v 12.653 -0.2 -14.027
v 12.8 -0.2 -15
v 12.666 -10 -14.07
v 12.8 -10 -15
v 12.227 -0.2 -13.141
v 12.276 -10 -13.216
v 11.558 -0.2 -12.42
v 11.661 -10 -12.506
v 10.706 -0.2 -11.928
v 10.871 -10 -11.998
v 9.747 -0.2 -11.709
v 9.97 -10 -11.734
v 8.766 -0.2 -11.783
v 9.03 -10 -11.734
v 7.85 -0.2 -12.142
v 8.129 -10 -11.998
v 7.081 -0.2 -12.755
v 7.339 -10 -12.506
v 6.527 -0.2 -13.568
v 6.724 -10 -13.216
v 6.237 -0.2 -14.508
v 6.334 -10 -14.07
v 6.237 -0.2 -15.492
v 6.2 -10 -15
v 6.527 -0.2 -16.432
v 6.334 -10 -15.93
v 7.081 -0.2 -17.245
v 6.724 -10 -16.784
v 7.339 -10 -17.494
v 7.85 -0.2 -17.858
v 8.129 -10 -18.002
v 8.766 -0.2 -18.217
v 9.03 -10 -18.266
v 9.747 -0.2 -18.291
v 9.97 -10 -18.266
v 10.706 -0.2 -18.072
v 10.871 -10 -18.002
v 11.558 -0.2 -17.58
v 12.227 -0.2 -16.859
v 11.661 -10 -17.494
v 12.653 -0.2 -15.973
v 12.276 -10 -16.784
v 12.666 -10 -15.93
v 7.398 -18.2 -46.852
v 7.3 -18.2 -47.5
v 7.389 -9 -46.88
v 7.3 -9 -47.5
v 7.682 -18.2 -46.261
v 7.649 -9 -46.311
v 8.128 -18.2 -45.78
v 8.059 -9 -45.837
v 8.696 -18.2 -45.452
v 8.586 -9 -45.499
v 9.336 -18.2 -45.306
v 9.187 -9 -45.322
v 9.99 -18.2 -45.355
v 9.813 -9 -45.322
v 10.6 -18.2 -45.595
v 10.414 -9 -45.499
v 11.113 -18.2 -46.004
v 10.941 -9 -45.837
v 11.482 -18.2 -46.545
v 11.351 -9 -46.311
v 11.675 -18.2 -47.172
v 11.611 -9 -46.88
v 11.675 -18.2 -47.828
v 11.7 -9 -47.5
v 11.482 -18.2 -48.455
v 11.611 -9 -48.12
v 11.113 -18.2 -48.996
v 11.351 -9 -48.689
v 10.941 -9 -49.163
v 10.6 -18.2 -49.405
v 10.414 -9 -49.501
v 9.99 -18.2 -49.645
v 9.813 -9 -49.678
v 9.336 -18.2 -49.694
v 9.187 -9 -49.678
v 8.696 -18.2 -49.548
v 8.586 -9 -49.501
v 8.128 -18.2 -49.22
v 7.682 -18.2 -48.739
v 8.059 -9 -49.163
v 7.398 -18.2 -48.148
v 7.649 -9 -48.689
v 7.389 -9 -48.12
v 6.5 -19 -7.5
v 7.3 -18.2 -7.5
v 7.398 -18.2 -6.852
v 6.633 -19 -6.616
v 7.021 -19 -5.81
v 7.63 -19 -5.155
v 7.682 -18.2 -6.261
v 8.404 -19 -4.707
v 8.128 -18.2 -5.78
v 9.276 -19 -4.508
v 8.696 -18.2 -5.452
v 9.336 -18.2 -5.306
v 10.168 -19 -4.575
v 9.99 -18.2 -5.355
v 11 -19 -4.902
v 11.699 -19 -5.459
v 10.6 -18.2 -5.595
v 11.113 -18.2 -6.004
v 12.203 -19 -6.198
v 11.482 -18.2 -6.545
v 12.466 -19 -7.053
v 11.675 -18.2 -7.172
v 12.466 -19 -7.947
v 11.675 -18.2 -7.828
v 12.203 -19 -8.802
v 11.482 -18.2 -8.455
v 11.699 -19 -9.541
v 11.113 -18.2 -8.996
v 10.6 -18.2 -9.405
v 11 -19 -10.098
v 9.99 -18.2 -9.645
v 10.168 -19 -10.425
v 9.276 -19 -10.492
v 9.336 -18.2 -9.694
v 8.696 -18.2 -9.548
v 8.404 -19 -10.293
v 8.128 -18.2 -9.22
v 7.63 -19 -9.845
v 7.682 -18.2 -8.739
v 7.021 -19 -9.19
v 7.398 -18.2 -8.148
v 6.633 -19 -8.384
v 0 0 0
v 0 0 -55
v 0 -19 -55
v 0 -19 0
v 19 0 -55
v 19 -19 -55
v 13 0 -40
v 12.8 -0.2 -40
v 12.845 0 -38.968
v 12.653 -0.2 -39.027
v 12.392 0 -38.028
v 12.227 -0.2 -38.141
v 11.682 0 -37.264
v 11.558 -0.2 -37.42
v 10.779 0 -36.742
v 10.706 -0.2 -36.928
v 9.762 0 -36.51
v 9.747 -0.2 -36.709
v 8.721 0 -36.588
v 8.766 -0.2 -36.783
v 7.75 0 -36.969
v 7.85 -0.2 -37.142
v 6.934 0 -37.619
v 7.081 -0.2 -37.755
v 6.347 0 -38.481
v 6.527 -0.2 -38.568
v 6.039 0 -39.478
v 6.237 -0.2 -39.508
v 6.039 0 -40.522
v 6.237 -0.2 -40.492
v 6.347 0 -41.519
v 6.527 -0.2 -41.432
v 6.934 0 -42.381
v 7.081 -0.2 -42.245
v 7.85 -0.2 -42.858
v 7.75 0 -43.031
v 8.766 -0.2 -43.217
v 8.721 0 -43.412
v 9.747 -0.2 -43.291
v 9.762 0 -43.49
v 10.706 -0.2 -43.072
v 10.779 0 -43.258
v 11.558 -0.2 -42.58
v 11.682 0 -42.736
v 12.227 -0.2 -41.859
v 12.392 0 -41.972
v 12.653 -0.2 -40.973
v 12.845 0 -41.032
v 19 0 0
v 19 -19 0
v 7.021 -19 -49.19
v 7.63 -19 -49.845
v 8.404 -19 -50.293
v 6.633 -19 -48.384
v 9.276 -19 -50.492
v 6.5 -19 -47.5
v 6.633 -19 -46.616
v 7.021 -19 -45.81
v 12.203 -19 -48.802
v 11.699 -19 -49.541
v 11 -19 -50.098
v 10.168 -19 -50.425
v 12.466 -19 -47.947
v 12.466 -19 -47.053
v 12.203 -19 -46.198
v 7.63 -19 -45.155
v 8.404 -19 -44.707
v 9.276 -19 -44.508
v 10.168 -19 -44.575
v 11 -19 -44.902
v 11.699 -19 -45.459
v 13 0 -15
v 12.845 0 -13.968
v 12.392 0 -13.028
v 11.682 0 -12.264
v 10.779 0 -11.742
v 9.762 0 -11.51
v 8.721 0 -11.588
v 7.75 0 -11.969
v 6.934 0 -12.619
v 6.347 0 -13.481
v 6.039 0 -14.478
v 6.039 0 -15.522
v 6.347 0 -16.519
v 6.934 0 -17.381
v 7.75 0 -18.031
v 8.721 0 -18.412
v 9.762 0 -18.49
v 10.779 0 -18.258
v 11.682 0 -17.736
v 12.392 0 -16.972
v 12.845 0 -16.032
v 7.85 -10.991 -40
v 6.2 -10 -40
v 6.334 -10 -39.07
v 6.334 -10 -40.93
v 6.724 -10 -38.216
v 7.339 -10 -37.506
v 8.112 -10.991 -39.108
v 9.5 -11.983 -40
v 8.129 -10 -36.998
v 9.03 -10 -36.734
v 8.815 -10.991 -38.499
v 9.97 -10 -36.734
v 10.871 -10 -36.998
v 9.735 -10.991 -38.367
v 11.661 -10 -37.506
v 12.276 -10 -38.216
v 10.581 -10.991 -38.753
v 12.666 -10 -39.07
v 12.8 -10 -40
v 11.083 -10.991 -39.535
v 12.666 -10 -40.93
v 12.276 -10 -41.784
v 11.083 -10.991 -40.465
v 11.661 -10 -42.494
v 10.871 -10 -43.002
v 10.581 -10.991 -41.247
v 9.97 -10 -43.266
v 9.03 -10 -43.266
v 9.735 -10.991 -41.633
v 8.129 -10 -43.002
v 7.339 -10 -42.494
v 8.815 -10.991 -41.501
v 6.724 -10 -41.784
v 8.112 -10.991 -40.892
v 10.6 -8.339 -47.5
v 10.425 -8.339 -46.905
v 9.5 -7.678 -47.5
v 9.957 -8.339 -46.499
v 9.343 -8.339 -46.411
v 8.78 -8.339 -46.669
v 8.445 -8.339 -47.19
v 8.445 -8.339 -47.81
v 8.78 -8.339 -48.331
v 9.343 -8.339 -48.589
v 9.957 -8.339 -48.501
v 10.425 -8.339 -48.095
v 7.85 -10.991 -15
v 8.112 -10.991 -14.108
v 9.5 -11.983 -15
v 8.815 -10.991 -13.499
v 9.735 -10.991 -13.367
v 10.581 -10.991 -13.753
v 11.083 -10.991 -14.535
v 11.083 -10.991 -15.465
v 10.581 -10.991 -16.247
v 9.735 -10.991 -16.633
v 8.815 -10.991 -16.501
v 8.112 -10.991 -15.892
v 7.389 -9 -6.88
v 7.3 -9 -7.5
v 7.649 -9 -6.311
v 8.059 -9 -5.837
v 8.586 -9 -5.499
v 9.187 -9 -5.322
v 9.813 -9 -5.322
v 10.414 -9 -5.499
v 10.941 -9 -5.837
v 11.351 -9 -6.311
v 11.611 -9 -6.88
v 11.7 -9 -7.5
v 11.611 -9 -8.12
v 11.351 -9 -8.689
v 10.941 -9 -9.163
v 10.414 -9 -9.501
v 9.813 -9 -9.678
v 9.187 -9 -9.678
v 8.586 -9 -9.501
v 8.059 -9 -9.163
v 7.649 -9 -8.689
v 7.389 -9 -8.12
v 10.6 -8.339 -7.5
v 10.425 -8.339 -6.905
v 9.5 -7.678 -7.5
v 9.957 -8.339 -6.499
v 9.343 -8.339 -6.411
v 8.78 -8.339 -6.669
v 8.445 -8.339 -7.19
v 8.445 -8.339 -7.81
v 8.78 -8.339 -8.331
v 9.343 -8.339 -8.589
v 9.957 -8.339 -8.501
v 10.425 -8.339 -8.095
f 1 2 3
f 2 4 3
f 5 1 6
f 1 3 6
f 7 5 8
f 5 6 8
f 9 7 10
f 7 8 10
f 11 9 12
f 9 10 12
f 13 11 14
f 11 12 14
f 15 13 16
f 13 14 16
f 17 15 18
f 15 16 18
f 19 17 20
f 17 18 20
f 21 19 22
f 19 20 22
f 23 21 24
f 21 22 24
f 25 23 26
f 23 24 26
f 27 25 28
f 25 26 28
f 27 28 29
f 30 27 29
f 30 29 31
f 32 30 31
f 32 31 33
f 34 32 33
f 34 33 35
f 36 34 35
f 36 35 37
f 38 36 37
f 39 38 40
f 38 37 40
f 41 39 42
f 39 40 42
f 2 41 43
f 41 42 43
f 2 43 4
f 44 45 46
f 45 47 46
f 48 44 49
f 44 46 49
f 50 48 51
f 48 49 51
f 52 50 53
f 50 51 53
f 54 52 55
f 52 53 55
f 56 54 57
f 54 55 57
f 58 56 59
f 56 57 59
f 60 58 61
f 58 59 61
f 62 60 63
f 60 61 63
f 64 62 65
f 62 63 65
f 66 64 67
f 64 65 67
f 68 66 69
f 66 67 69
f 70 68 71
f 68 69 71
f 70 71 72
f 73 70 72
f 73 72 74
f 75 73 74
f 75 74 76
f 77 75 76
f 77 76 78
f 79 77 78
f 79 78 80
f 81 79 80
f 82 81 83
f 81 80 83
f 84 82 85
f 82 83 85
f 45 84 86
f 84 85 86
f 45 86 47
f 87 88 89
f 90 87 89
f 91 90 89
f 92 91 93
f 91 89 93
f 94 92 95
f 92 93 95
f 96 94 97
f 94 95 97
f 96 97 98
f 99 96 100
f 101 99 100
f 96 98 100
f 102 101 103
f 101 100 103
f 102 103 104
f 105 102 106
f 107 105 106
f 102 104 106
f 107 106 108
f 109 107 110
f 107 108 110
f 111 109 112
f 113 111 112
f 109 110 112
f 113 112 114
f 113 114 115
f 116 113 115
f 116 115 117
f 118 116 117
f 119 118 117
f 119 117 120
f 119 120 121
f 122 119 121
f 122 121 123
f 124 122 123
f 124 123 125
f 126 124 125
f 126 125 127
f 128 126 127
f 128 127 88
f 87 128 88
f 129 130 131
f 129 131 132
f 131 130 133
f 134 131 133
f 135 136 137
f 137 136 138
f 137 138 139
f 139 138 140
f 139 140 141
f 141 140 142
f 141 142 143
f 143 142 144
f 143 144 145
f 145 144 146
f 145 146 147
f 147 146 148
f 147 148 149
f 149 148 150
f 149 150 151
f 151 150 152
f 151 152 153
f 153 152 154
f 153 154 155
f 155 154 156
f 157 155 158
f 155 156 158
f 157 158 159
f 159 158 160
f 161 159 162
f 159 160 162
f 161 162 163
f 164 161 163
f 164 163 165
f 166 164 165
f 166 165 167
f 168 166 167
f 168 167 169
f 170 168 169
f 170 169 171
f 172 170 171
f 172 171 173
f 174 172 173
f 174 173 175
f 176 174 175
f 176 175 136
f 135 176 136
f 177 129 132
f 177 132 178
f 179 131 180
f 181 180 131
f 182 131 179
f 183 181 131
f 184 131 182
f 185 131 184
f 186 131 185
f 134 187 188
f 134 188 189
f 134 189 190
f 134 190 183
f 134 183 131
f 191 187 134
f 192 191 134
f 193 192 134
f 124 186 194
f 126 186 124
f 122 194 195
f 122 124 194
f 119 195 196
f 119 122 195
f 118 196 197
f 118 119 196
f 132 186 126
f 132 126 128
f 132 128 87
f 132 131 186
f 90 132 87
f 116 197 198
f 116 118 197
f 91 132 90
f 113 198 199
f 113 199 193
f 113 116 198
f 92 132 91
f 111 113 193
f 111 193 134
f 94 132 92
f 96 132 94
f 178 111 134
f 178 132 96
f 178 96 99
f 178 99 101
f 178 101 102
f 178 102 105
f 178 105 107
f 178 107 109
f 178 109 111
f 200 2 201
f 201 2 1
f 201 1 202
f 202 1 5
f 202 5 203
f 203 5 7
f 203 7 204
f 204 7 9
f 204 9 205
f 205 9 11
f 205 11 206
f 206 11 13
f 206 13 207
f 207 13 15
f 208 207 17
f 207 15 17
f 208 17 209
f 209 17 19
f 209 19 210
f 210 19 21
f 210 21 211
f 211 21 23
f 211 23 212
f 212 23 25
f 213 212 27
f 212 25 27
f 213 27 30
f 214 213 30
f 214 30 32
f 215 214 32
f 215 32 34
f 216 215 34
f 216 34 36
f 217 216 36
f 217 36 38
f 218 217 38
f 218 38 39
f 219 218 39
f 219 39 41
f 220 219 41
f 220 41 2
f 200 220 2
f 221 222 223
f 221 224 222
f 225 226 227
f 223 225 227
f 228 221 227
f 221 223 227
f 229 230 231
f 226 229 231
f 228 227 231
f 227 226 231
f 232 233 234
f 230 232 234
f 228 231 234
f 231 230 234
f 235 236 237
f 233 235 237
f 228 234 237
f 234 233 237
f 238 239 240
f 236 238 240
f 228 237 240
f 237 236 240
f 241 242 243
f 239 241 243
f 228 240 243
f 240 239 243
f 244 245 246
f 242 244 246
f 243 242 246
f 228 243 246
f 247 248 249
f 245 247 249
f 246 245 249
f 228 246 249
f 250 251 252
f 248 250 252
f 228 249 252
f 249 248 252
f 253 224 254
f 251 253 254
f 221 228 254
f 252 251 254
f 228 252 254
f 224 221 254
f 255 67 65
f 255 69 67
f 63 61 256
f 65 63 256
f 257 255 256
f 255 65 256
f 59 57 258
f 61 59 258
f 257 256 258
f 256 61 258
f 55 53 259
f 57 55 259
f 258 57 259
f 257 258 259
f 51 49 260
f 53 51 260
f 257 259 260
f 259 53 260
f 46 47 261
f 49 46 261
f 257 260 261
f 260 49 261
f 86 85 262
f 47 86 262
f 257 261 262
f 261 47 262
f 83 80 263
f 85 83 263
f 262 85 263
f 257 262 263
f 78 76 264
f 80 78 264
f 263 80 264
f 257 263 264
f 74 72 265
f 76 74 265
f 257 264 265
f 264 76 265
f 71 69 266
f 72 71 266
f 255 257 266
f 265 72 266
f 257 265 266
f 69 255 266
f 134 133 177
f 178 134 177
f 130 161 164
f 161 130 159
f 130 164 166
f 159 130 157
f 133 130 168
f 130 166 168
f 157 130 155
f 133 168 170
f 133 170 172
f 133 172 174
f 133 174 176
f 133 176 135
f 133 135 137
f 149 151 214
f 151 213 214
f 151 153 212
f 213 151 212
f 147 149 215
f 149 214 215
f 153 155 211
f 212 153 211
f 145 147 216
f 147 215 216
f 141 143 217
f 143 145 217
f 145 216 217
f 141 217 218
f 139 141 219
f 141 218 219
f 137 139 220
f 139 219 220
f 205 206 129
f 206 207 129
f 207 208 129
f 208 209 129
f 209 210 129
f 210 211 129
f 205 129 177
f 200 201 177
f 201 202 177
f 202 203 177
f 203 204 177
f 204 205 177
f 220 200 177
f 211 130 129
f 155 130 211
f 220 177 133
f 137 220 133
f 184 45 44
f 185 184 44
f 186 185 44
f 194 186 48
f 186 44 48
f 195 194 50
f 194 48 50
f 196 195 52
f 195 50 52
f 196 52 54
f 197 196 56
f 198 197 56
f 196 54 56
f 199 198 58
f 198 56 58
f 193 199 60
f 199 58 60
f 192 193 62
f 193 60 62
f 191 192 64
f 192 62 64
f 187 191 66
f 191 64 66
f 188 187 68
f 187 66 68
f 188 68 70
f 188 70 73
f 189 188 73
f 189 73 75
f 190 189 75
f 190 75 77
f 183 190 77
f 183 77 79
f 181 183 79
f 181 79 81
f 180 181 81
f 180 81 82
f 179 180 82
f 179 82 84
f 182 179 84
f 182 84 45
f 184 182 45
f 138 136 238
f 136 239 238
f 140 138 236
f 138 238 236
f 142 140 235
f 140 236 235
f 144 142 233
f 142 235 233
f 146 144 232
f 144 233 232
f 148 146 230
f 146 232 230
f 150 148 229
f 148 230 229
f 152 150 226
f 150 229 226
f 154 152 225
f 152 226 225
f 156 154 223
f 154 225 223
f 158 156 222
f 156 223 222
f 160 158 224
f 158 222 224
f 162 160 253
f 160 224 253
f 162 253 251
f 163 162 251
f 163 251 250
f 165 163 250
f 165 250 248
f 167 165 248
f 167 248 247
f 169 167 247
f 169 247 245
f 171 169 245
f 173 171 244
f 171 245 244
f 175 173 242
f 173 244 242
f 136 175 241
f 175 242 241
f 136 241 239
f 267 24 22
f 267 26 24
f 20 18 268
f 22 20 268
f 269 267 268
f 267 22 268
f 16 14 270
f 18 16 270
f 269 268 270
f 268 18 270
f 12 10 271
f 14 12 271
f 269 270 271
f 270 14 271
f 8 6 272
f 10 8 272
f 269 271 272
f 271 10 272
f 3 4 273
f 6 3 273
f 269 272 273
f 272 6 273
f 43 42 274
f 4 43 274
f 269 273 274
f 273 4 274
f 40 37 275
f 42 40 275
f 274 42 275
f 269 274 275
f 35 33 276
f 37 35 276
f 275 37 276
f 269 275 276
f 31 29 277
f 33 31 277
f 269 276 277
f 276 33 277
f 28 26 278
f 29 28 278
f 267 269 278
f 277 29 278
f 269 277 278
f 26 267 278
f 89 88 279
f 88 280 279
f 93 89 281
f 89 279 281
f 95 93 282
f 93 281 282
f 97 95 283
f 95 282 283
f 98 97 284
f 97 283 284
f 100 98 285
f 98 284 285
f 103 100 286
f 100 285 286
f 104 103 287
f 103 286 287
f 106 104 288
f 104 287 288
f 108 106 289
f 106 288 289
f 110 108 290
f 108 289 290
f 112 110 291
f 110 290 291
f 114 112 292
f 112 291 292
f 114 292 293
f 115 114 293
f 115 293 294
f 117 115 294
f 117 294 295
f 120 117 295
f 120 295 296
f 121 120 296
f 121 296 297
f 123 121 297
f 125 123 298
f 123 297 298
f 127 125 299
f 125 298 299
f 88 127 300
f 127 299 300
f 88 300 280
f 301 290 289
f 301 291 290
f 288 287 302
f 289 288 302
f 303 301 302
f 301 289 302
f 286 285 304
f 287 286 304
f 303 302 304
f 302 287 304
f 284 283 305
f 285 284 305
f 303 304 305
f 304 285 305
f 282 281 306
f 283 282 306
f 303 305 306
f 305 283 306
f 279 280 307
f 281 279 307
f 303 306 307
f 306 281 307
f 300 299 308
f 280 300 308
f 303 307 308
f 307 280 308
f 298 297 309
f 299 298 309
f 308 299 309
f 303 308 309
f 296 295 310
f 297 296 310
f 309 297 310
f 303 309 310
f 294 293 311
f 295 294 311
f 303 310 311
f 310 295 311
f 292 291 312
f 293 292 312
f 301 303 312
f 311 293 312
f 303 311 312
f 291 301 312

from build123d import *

# Parameters (mm, degrees)
F0_W           = 19
F0_H           = 55
F1_DEPTH       = 19
F3_D           = 4.4
F3_DEPTH       = 10
F3_CSINK_D     = 6
F3_CSINK_ANGLE = 90
F3_TIP         = 1.3218933619
F5_D           = 6.6
F5_DEPTH       = 10
F5_CSINK_D     = 7
F5_CSINK_ANGLE = 90
F5_TIP         = 1.9828400428


with BuildPart() as f1:
    # F0 (on Front) → F1 (new body)
    with BuildSketch(Plane.XZ):
        with Locations((9.5, -27.5)):
            Rectangle(F0_W, F0_H)
    extrude(amount=F1_DEPTH)

    # F3
    with Locations(Plane.XZ.offset(19)):
        with Locations((9.5, -7.5), (9.5, -47.5)):
            CounterSinkHole(F3_D / 2, F3_CSINK_D / 2, depth=F3_DEPTH, counter_sink_angle=F3_CSINK_ANGLE)
            with Locations((0, 0, -(F3_DEPTH + F3_TIP / 2))):  # 118° drill point
                Cone(0, F3_D / 2, F3_TIP, mode=Mode.SUBTRACT)

    # F5
    with Locations(Plane(origin=(0, 0, 0), x_dir=(-1, 0, 0), z_dir=(0, 1, 0))):
        with Locations((-9.5, -15), (-9.5, -40)):
            CounterSinkHole(F5_D / 2, F5_CSINK_D / 2, depth=F5_DEPTH, counter_sink_angle=F5_CSINK_ANGLE)
            with Locations((0, 0, -(F5_DEPTH + F5_TIP / 2))):  # 118° drill point
                Cone(0, F5_D / 2, F5_TIP, mode=Mode.SUBTRACT)


solid = f1.part
